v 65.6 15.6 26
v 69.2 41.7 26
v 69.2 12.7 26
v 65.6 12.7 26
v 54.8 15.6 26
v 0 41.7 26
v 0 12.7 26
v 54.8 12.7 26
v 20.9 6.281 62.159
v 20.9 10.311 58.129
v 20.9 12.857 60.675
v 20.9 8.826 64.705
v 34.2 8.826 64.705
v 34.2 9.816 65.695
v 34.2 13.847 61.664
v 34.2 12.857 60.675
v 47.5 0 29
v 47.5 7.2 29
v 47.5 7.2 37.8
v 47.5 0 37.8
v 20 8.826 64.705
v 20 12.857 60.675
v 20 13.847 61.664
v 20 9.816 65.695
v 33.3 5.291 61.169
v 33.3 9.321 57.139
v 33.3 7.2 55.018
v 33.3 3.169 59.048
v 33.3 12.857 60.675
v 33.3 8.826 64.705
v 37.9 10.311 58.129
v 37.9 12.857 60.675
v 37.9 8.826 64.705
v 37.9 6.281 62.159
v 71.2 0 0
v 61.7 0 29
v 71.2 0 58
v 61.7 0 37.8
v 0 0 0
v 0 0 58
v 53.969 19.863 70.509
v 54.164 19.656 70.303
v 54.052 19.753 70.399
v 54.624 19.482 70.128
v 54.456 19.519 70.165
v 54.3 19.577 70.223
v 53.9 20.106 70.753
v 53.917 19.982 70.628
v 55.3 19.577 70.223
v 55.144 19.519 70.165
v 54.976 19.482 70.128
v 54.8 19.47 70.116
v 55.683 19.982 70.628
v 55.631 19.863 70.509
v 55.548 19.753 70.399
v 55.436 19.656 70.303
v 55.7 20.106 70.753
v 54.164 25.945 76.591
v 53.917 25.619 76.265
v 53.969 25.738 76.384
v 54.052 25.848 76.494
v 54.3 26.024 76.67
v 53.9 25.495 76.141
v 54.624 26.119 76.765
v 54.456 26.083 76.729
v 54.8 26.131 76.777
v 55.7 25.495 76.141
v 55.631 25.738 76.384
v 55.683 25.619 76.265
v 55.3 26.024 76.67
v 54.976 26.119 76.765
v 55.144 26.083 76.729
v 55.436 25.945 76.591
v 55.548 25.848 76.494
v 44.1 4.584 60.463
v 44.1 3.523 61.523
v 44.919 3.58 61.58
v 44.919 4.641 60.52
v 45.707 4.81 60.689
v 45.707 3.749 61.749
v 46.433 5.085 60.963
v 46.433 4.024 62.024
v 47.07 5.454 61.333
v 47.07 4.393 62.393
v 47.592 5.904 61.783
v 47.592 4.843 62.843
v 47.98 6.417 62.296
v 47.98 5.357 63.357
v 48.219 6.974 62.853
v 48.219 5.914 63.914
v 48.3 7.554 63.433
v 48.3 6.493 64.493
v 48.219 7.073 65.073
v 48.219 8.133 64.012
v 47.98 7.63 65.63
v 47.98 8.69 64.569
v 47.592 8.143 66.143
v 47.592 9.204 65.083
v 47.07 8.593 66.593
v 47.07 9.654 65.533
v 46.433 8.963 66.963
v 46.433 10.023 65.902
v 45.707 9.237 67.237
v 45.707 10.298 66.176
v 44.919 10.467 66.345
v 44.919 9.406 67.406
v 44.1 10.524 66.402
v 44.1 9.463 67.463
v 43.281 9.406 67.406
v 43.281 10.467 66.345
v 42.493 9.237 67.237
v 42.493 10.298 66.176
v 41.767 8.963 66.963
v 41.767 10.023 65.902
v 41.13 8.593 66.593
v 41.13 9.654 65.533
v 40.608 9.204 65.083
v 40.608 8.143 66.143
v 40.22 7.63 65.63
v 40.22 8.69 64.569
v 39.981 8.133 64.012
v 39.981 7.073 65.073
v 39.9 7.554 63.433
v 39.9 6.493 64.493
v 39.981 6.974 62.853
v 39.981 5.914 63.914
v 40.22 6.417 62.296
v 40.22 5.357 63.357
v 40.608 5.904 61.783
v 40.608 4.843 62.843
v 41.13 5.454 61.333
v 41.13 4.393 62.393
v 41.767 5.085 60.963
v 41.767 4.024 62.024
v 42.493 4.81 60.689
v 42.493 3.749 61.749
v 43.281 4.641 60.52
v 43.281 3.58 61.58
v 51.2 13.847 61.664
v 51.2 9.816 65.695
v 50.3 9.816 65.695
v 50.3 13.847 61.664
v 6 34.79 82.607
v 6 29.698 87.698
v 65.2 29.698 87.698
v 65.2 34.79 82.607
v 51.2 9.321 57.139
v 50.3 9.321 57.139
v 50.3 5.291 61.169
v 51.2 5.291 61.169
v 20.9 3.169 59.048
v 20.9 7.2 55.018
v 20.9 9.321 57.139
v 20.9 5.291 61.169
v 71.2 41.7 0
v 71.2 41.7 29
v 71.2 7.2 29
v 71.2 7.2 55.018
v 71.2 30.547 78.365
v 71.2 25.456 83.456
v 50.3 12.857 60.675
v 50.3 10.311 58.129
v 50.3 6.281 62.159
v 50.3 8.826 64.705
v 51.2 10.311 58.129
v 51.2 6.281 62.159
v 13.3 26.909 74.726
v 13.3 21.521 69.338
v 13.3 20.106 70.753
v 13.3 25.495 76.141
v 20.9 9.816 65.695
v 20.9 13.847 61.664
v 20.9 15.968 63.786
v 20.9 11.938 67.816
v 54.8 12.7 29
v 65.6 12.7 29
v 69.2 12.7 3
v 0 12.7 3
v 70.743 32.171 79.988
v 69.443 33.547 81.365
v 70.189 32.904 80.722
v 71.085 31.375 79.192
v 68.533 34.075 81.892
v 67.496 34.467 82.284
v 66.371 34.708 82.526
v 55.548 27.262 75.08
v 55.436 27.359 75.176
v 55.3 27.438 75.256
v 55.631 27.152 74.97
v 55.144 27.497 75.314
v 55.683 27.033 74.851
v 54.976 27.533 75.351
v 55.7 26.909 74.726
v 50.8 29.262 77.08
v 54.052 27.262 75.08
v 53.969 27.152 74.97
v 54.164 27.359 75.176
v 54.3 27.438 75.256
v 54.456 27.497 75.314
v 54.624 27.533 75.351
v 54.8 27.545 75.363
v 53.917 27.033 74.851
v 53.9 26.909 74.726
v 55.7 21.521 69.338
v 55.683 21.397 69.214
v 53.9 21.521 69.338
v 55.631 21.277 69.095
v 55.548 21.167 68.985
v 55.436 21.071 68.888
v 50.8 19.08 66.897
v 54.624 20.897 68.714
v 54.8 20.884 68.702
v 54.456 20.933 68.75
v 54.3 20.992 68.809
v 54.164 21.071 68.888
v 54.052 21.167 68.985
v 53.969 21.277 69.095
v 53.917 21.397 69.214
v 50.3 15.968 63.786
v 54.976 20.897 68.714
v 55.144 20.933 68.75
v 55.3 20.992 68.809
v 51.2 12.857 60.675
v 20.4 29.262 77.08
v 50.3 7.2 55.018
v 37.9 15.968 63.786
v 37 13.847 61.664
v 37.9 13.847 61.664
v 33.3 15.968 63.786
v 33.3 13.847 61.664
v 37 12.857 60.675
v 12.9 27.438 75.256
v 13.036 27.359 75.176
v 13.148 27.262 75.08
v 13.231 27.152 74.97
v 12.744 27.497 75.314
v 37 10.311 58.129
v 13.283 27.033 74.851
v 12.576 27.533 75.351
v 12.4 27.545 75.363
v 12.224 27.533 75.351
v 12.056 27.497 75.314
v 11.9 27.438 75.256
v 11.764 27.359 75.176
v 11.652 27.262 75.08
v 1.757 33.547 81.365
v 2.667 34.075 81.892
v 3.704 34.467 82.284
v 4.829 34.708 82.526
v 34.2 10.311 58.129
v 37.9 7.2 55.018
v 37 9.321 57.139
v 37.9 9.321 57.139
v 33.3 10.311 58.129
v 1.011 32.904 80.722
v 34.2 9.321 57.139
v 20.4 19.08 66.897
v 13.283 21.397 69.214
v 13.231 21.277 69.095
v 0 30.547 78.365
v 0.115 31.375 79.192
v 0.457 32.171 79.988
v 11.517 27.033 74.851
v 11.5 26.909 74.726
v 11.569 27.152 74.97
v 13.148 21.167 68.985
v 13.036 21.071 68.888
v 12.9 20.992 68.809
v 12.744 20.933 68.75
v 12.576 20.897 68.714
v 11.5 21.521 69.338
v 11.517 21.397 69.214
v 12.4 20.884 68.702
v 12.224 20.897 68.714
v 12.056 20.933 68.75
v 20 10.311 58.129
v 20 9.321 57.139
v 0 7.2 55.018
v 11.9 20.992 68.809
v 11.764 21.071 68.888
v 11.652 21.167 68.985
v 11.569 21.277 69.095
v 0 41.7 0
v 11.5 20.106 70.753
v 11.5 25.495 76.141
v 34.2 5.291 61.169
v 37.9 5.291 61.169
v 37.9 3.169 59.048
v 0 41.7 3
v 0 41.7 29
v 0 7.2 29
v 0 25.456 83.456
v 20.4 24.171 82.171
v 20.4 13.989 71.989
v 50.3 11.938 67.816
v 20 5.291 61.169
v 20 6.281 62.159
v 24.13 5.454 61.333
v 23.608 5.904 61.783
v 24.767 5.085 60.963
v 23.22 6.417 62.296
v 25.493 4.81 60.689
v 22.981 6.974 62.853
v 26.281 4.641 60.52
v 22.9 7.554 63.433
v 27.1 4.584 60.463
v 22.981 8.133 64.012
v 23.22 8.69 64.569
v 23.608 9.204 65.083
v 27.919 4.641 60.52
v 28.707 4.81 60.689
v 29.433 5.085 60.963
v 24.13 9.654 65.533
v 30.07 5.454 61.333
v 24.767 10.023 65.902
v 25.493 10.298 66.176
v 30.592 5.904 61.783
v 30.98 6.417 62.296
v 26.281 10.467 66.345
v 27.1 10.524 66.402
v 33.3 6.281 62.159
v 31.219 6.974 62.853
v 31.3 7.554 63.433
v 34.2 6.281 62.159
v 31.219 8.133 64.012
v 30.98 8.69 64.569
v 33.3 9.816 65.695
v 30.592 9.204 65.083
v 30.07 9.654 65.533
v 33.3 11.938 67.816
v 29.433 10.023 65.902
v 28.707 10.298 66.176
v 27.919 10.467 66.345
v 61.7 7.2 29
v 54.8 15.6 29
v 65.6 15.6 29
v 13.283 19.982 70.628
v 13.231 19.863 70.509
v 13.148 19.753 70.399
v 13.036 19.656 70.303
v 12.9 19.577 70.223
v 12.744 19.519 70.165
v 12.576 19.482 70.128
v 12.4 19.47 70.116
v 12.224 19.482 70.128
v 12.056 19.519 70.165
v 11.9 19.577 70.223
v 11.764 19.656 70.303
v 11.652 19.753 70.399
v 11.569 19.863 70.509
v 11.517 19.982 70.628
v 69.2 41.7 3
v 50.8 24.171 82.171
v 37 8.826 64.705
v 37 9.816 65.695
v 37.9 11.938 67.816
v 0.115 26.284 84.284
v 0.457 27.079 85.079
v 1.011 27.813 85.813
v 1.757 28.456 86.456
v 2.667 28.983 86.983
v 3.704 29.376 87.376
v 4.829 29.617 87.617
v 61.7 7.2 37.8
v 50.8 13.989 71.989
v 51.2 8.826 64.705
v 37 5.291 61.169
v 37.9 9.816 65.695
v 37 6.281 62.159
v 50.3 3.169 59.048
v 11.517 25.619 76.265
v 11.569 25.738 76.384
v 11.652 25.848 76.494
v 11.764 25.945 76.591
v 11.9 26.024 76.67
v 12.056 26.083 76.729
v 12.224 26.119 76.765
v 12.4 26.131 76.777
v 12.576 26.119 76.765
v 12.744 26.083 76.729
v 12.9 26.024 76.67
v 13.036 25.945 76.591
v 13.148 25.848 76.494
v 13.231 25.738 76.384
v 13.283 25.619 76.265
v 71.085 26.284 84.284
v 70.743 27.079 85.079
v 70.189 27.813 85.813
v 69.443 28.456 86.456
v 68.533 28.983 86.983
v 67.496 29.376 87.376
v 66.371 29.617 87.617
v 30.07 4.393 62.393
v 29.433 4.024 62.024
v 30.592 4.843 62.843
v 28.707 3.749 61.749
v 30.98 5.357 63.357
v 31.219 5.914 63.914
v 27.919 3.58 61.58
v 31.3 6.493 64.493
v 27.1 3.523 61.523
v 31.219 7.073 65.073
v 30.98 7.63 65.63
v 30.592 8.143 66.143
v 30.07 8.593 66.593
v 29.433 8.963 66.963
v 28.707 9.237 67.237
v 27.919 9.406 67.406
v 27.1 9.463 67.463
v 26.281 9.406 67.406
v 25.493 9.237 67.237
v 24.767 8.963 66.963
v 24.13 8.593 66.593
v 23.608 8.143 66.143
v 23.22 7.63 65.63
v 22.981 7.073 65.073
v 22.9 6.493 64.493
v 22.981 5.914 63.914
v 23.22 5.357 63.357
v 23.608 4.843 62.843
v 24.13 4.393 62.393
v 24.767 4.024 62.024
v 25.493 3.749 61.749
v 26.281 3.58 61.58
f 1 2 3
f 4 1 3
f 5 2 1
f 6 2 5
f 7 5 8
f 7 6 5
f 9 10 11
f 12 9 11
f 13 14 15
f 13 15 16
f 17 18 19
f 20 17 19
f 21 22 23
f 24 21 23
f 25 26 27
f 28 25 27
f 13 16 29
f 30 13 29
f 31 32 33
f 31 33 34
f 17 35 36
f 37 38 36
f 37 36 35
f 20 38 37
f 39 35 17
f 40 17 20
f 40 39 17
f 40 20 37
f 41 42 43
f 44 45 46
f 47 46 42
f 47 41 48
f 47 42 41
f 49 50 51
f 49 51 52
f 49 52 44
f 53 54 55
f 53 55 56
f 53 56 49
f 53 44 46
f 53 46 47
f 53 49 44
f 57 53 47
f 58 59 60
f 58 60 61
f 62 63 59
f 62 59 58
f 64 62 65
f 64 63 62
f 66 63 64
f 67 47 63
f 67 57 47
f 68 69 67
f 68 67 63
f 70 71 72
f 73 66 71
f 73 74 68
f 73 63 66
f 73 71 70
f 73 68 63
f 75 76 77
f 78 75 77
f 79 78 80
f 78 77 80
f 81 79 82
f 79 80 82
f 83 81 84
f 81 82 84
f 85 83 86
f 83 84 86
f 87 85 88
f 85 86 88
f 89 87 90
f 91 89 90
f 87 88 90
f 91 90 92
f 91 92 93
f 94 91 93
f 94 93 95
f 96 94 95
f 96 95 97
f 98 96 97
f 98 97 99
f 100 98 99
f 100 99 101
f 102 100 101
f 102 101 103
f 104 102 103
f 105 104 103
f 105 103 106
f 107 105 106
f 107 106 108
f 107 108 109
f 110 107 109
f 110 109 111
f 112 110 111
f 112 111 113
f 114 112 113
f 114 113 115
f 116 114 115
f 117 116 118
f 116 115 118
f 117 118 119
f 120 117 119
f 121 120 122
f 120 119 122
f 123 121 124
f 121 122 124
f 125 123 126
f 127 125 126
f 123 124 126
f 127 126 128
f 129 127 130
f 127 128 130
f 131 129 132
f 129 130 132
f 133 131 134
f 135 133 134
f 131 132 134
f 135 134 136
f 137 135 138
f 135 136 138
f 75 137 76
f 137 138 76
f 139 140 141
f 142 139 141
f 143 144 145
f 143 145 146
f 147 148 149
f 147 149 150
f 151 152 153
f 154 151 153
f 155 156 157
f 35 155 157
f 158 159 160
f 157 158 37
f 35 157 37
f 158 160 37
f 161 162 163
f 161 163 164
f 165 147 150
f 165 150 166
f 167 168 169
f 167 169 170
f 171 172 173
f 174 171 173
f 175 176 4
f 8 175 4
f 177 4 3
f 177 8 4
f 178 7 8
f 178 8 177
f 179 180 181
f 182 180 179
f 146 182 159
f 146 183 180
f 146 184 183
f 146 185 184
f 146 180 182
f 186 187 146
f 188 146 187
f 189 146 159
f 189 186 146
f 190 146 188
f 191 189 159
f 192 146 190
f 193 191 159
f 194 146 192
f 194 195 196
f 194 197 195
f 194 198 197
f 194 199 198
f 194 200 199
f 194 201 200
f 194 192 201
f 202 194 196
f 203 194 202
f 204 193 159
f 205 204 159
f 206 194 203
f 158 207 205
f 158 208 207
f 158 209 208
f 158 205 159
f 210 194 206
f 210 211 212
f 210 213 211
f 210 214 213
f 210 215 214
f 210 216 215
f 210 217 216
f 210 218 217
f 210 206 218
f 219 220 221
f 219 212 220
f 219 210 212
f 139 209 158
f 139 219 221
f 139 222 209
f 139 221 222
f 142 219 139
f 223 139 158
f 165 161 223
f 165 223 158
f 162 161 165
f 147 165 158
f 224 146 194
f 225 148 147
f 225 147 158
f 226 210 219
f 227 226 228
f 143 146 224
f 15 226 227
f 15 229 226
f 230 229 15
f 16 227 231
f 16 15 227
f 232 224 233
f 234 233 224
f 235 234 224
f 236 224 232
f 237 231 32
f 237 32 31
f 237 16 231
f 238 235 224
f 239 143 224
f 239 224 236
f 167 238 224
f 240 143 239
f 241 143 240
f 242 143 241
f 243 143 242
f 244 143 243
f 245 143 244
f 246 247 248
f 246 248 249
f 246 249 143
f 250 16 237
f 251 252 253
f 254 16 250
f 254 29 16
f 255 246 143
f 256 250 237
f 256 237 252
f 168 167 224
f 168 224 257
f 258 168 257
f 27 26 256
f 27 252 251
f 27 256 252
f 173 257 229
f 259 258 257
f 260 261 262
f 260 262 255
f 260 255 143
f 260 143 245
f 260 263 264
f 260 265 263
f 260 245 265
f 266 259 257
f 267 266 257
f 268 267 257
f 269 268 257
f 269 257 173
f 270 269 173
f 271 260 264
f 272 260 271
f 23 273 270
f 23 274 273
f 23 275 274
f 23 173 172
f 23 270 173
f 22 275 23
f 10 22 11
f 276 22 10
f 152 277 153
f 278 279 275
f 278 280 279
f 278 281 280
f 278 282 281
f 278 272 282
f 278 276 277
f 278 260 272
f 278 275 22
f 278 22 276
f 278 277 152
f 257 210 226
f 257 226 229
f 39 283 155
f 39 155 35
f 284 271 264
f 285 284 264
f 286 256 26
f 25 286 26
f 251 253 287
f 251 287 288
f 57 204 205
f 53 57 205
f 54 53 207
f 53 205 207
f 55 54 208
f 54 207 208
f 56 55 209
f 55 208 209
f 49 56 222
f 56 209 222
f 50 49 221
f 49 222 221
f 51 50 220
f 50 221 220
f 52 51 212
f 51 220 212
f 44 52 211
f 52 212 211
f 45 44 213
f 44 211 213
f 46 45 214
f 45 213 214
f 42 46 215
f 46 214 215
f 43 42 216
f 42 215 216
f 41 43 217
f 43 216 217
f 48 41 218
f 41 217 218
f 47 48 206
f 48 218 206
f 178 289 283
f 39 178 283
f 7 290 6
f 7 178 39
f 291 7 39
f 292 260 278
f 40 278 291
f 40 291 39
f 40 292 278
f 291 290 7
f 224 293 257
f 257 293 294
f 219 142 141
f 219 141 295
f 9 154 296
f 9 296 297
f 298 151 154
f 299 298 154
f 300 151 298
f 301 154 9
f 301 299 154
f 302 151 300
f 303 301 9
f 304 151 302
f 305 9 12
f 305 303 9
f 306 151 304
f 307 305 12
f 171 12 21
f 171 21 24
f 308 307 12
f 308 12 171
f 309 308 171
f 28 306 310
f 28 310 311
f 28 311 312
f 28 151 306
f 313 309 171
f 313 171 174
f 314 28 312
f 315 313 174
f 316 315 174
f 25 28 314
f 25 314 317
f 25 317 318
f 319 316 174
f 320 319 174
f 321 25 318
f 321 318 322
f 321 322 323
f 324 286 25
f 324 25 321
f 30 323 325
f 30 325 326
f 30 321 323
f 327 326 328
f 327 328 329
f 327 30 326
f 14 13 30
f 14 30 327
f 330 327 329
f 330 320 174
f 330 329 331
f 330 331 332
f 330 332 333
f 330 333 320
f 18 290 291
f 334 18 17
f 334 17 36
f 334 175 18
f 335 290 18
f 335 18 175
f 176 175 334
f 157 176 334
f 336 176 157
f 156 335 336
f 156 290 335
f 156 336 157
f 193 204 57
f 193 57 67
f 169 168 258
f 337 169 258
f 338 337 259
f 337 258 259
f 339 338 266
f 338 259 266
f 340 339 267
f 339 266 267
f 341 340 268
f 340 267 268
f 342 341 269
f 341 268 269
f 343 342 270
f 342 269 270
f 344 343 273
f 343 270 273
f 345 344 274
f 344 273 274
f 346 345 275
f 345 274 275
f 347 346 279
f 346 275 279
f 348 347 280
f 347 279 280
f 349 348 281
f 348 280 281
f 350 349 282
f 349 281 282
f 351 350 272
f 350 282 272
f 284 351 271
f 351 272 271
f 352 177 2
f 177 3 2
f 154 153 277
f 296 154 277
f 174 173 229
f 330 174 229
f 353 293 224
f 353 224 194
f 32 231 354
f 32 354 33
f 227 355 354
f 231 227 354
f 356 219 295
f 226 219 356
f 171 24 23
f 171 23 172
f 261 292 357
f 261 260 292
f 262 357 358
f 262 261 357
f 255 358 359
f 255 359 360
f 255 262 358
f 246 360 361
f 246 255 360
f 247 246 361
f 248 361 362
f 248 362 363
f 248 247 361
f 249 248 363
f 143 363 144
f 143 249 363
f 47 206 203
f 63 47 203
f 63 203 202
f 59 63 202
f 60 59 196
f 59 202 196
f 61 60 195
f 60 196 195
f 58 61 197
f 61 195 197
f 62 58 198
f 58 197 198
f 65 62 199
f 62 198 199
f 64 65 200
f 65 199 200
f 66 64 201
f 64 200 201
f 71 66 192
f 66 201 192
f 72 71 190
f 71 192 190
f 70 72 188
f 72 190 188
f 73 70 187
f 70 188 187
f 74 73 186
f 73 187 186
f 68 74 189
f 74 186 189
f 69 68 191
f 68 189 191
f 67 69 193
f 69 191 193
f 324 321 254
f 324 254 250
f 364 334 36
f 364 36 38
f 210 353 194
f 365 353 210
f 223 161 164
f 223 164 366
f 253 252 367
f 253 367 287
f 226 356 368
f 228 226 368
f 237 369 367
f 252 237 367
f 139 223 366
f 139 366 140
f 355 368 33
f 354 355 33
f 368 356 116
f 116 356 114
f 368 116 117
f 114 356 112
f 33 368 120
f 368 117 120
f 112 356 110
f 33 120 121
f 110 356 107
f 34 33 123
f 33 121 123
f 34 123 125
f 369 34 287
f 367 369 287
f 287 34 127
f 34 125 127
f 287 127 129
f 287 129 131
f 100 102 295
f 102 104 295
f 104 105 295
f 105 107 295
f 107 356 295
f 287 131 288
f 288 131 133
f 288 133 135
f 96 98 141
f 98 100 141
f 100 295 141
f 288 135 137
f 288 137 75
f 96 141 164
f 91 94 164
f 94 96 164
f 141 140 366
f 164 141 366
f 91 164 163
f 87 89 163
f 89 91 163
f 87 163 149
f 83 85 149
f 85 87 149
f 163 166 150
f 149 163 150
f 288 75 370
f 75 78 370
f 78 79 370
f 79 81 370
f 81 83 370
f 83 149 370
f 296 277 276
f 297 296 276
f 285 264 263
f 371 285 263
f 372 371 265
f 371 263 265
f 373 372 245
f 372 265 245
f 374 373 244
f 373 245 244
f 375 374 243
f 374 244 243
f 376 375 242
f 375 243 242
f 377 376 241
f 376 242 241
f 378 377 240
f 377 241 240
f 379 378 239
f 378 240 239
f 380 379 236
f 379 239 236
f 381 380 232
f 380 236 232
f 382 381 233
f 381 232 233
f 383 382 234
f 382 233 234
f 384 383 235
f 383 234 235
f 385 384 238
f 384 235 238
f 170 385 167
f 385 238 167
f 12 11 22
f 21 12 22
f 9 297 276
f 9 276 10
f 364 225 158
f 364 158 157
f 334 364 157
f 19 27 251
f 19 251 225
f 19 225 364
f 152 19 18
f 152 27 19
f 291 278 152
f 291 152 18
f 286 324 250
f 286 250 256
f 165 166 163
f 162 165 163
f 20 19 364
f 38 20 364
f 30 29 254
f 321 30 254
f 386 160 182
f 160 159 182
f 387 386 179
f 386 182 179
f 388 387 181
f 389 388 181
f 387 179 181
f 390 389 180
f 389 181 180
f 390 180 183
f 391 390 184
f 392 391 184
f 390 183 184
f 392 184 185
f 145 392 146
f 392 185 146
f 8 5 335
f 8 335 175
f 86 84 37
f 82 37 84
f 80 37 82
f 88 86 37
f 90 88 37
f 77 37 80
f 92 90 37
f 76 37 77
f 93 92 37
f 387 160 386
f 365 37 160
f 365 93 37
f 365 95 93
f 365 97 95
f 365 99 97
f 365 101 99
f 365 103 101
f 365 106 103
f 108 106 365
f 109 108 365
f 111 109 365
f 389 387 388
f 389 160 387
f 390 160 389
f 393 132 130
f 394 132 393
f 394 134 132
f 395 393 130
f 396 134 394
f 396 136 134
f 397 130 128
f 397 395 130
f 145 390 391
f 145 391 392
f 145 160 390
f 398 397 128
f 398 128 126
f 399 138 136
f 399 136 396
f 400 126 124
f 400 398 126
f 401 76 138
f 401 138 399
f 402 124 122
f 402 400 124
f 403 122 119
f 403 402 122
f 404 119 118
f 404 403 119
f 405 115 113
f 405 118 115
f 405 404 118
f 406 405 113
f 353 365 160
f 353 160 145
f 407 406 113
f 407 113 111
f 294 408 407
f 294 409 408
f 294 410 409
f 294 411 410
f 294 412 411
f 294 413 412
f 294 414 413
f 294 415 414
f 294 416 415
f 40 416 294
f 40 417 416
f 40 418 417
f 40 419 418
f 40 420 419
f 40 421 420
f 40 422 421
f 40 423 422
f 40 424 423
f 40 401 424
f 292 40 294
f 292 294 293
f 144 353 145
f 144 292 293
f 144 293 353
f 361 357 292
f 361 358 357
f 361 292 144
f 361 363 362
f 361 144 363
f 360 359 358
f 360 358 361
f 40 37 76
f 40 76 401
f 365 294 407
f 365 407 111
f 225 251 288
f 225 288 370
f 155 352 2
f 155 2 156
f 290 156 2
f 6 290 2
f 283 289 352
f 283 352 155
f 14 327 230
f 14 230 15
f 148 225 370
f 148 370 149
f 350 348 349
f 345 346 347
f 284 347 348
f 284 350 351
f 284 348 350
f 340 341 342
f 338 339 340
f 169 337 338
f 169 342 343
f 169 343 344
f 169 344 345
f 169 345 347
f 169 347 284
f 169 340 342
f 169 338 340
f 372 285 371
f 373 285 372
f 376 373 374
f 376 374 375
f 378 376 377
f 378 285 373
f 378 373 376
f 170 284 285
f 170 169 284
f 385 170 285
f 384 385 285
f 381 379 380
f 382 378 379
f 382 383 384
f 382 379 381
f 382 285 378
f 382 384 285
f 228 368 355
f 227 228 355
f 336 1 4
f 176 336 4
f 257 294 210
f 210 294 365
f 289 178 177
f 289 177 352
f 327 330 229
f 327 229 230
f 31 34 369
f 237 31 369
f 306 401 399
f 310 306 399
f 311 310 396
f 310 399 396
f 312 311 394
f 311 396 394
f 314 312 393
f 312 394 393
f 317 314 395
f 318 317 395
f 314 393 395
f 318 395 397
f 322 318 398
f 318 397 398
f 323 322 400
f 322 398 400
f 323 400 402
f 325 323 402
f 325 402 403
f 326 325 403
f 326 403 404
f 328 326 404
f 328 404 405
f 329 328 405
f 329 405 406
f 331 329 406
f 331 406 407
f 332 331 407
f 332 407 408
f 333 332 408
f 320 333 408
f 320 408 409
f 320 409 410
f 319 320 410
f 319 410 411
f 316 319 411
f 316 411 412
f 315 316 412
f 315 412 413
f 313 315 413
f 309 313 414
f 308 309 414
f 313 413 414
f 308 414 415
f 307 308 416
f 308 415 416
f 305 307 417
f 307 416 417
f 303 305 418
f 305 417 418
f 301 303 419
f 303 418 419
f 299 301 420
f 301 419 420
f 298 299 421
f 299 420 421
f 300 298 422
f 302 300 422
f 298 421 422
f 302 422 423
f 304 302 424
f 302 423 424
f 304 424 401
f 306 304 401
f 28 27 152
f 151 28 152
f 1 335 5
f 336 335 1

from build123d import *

# Parameters (mm, degrees)
PAD_DEPTH       = 71.2
POCKET_DEPTH    = 5.7
SKETCH001_R     = 4.2
SKETCH001_W     = 14.4
SKETCH001_H     = 30.4
POCKET001_DEPTH = 7.5
SKETCH003_W     = 41.7
SKETCH003_H     = 29
PAD001002_DEPTH = 2
POCKET002_DEPTH = 2
SKETCH005_W     = 2.9
SKETCH005_H     = 10.8
POCKET003_DEPTH = 4
SKETCH006_W     = 8.8
SKETCH006_H     = 14.2
POCKET004_DEPTH = 7.201
FILLET_R        = 6


with BuildPart() as part:
    # Sketch → Pad (new body)
    with BuildSketch(Plane.YZ):
        Polygon((0, 0), (0, 58), (29.698485, 87.698485), (34.789654, 82.607316), (7.2, 55.017662), (7.2, 29), (41.7, 29), (41.7, 26), (12.7, 26), (12.7, 3), (41.7, 3), (41.7, 0), align=None)
    extrude(amount=PAD_DEPTH)

    # Sketch002 (on Face8 of Pad) → Pocket (cut)
    with BuildSketch(Plane(origin=(0, -23.908831, 23.908831), x_dir=(0, 0.707107, 0.707107), z_dir=(0, 0.707107, -0.707107))):
        Polygon((56.394531, 50.3), (56.394531, 37.9), (53.394531, 37.9), (53.394531, 37), (51.994531, 37), (51.994531, 37.9), (48.394531, 37.9), (48.394531, 37), (46.994531, 37), (46.994531, 37.9), (43.994531, 37.9), (43.994531, 50.3), (46.994531, 50.3), (46.994531, 51.2), (48.394531, 51.2), (48.394531, 50.3), (51.994531, 50.3), (51.994531, 51.2), (53.394531, 51.2), (53.394531, 50.3), align=None)
        Polygon((43.994531, 20.9), (46.994531, 20.9), (46.994531, 20), (48.394531, 20), (48.394531, 20.9), (51.994531, 20.9), (51.994531, 20), (53.394531, 20), (53.394531, 20.9), (56.394531, 20.9), (56.394531, 33.3), (53.394531, 33.3), (53.394531, 34.2), (51.994531, 34.2), (51.994531, 33.3), (48.394531, 33.3), (48.394531, 34.2), (46.994531, 34.2), (46.994531, 33.3), (43.994531, 33.3), align=None)
    extrude(amount=-POCKET_DEPTH, mode=Mode.SUBTRACT)

    # Sketch001 (on Face10 of Pocket) → Pocket001 (cut)
    with BuildSketch(Plane(origin=(0, -29, 29), x_dir=(0, -0.707107, -0.707107), z_dir=(0, -0.707107, 0.707107))):
        with Locations((-50.195, 44.1)):
            Circle(SKETCH001_R)
        with Locations((-50.195, 27.1)):
            Circle(SKETCH001_R)
        with Locations((-67.995, 35.6)):
            Rectangle(SKETCH001_W, SKETCH001_H)
    extrude(amount=-POCKET001_DEPTH, mode=Mode.SUBTRACT)

    # Sketch003 (on Face5 of Pocket001) → Pad001002 (join)
    with BuildSketch(Plane.YZ.offset(71.2)):
        with Locations((20.85, 14.5)):
            Rectangle(SKETCH003_W, SKETCH003_H)
    extrude(amount=-PAD001002_DEPTH)

    # Sketch004 (on Face8 of Pad001002) → Pocket002 (cut)
    with BuildSketch(Plane(origin=(0, -23.908831, 23.908831), x_dir=(0, 0.707107, 0.707107), z_dir=(0, 0.707107, -0.707107))):
        with BuildLine():
            ThreePointArc((64.247016, 55.7), (63.347016, 54.8), (64.247016, 53.9))
            Line((64.247016, 53.9), (71.867016, 53.9))
            ThreePointArc((71.867016, 53.9), (72.767016, 54.8), (71.867016, 55.7))
            Line((64.247016, 55.7), (71.867016, 55.7))
        make_face()
        with BuildLine():
            ThreePointArc((64.247016, 13.3), (63.347016, 12.4), (64.247016, 11.5))
            Line((64.247016, 11.5), (71.867016, 11.5))
            ThreePointArc((71.867016, 11.5), (72.767016, 12.4), (71.867016, 13.3))
            Line((64.247016, 13.3), (71.867016, 13.3))
        make_face()
    extrude(amount=-POCKET002_DEPTH, mode=Mode.SUBTRACT)

    # Sketch005 (on Face13 of Pocket002) → Pocket003 (cut)
    with BuildSketch(Plane(origin=(0, 0, 29), x_dir=(0, -1, 0), z_dir=(0, 0, 1))):
        with Locations((-14.15, 60.2)):
            Rectangle(SKETCH005_W, SKETCH005_H)
    extrude(amount=-POCKET003_DEPTH, mode=Mode.SUBTRACT)

    # Sketch006 (on Face11 of Pocket003) → Pocket004 (cut, through all)
    with BuildSketch(Plane.ZX.offset(7.2)):
        with Locations((33.4, 54.6)):
            Rectangle(SKETCH006_W, SKETCH006_H)
    extrude(amount=-POCKET004_DEPTH, mode=Mode.SUBTRACT)

    # Fillet
    fillet_edges = [part.edges().sort_by_distance(p)[0] for p in [
        (71.2, 32.244069, 85.1529),
        (0, 32.244069, 85.1529),
    ]]
    fillet(fillet_edges, radius=FILLET_R)


solid = part.part
